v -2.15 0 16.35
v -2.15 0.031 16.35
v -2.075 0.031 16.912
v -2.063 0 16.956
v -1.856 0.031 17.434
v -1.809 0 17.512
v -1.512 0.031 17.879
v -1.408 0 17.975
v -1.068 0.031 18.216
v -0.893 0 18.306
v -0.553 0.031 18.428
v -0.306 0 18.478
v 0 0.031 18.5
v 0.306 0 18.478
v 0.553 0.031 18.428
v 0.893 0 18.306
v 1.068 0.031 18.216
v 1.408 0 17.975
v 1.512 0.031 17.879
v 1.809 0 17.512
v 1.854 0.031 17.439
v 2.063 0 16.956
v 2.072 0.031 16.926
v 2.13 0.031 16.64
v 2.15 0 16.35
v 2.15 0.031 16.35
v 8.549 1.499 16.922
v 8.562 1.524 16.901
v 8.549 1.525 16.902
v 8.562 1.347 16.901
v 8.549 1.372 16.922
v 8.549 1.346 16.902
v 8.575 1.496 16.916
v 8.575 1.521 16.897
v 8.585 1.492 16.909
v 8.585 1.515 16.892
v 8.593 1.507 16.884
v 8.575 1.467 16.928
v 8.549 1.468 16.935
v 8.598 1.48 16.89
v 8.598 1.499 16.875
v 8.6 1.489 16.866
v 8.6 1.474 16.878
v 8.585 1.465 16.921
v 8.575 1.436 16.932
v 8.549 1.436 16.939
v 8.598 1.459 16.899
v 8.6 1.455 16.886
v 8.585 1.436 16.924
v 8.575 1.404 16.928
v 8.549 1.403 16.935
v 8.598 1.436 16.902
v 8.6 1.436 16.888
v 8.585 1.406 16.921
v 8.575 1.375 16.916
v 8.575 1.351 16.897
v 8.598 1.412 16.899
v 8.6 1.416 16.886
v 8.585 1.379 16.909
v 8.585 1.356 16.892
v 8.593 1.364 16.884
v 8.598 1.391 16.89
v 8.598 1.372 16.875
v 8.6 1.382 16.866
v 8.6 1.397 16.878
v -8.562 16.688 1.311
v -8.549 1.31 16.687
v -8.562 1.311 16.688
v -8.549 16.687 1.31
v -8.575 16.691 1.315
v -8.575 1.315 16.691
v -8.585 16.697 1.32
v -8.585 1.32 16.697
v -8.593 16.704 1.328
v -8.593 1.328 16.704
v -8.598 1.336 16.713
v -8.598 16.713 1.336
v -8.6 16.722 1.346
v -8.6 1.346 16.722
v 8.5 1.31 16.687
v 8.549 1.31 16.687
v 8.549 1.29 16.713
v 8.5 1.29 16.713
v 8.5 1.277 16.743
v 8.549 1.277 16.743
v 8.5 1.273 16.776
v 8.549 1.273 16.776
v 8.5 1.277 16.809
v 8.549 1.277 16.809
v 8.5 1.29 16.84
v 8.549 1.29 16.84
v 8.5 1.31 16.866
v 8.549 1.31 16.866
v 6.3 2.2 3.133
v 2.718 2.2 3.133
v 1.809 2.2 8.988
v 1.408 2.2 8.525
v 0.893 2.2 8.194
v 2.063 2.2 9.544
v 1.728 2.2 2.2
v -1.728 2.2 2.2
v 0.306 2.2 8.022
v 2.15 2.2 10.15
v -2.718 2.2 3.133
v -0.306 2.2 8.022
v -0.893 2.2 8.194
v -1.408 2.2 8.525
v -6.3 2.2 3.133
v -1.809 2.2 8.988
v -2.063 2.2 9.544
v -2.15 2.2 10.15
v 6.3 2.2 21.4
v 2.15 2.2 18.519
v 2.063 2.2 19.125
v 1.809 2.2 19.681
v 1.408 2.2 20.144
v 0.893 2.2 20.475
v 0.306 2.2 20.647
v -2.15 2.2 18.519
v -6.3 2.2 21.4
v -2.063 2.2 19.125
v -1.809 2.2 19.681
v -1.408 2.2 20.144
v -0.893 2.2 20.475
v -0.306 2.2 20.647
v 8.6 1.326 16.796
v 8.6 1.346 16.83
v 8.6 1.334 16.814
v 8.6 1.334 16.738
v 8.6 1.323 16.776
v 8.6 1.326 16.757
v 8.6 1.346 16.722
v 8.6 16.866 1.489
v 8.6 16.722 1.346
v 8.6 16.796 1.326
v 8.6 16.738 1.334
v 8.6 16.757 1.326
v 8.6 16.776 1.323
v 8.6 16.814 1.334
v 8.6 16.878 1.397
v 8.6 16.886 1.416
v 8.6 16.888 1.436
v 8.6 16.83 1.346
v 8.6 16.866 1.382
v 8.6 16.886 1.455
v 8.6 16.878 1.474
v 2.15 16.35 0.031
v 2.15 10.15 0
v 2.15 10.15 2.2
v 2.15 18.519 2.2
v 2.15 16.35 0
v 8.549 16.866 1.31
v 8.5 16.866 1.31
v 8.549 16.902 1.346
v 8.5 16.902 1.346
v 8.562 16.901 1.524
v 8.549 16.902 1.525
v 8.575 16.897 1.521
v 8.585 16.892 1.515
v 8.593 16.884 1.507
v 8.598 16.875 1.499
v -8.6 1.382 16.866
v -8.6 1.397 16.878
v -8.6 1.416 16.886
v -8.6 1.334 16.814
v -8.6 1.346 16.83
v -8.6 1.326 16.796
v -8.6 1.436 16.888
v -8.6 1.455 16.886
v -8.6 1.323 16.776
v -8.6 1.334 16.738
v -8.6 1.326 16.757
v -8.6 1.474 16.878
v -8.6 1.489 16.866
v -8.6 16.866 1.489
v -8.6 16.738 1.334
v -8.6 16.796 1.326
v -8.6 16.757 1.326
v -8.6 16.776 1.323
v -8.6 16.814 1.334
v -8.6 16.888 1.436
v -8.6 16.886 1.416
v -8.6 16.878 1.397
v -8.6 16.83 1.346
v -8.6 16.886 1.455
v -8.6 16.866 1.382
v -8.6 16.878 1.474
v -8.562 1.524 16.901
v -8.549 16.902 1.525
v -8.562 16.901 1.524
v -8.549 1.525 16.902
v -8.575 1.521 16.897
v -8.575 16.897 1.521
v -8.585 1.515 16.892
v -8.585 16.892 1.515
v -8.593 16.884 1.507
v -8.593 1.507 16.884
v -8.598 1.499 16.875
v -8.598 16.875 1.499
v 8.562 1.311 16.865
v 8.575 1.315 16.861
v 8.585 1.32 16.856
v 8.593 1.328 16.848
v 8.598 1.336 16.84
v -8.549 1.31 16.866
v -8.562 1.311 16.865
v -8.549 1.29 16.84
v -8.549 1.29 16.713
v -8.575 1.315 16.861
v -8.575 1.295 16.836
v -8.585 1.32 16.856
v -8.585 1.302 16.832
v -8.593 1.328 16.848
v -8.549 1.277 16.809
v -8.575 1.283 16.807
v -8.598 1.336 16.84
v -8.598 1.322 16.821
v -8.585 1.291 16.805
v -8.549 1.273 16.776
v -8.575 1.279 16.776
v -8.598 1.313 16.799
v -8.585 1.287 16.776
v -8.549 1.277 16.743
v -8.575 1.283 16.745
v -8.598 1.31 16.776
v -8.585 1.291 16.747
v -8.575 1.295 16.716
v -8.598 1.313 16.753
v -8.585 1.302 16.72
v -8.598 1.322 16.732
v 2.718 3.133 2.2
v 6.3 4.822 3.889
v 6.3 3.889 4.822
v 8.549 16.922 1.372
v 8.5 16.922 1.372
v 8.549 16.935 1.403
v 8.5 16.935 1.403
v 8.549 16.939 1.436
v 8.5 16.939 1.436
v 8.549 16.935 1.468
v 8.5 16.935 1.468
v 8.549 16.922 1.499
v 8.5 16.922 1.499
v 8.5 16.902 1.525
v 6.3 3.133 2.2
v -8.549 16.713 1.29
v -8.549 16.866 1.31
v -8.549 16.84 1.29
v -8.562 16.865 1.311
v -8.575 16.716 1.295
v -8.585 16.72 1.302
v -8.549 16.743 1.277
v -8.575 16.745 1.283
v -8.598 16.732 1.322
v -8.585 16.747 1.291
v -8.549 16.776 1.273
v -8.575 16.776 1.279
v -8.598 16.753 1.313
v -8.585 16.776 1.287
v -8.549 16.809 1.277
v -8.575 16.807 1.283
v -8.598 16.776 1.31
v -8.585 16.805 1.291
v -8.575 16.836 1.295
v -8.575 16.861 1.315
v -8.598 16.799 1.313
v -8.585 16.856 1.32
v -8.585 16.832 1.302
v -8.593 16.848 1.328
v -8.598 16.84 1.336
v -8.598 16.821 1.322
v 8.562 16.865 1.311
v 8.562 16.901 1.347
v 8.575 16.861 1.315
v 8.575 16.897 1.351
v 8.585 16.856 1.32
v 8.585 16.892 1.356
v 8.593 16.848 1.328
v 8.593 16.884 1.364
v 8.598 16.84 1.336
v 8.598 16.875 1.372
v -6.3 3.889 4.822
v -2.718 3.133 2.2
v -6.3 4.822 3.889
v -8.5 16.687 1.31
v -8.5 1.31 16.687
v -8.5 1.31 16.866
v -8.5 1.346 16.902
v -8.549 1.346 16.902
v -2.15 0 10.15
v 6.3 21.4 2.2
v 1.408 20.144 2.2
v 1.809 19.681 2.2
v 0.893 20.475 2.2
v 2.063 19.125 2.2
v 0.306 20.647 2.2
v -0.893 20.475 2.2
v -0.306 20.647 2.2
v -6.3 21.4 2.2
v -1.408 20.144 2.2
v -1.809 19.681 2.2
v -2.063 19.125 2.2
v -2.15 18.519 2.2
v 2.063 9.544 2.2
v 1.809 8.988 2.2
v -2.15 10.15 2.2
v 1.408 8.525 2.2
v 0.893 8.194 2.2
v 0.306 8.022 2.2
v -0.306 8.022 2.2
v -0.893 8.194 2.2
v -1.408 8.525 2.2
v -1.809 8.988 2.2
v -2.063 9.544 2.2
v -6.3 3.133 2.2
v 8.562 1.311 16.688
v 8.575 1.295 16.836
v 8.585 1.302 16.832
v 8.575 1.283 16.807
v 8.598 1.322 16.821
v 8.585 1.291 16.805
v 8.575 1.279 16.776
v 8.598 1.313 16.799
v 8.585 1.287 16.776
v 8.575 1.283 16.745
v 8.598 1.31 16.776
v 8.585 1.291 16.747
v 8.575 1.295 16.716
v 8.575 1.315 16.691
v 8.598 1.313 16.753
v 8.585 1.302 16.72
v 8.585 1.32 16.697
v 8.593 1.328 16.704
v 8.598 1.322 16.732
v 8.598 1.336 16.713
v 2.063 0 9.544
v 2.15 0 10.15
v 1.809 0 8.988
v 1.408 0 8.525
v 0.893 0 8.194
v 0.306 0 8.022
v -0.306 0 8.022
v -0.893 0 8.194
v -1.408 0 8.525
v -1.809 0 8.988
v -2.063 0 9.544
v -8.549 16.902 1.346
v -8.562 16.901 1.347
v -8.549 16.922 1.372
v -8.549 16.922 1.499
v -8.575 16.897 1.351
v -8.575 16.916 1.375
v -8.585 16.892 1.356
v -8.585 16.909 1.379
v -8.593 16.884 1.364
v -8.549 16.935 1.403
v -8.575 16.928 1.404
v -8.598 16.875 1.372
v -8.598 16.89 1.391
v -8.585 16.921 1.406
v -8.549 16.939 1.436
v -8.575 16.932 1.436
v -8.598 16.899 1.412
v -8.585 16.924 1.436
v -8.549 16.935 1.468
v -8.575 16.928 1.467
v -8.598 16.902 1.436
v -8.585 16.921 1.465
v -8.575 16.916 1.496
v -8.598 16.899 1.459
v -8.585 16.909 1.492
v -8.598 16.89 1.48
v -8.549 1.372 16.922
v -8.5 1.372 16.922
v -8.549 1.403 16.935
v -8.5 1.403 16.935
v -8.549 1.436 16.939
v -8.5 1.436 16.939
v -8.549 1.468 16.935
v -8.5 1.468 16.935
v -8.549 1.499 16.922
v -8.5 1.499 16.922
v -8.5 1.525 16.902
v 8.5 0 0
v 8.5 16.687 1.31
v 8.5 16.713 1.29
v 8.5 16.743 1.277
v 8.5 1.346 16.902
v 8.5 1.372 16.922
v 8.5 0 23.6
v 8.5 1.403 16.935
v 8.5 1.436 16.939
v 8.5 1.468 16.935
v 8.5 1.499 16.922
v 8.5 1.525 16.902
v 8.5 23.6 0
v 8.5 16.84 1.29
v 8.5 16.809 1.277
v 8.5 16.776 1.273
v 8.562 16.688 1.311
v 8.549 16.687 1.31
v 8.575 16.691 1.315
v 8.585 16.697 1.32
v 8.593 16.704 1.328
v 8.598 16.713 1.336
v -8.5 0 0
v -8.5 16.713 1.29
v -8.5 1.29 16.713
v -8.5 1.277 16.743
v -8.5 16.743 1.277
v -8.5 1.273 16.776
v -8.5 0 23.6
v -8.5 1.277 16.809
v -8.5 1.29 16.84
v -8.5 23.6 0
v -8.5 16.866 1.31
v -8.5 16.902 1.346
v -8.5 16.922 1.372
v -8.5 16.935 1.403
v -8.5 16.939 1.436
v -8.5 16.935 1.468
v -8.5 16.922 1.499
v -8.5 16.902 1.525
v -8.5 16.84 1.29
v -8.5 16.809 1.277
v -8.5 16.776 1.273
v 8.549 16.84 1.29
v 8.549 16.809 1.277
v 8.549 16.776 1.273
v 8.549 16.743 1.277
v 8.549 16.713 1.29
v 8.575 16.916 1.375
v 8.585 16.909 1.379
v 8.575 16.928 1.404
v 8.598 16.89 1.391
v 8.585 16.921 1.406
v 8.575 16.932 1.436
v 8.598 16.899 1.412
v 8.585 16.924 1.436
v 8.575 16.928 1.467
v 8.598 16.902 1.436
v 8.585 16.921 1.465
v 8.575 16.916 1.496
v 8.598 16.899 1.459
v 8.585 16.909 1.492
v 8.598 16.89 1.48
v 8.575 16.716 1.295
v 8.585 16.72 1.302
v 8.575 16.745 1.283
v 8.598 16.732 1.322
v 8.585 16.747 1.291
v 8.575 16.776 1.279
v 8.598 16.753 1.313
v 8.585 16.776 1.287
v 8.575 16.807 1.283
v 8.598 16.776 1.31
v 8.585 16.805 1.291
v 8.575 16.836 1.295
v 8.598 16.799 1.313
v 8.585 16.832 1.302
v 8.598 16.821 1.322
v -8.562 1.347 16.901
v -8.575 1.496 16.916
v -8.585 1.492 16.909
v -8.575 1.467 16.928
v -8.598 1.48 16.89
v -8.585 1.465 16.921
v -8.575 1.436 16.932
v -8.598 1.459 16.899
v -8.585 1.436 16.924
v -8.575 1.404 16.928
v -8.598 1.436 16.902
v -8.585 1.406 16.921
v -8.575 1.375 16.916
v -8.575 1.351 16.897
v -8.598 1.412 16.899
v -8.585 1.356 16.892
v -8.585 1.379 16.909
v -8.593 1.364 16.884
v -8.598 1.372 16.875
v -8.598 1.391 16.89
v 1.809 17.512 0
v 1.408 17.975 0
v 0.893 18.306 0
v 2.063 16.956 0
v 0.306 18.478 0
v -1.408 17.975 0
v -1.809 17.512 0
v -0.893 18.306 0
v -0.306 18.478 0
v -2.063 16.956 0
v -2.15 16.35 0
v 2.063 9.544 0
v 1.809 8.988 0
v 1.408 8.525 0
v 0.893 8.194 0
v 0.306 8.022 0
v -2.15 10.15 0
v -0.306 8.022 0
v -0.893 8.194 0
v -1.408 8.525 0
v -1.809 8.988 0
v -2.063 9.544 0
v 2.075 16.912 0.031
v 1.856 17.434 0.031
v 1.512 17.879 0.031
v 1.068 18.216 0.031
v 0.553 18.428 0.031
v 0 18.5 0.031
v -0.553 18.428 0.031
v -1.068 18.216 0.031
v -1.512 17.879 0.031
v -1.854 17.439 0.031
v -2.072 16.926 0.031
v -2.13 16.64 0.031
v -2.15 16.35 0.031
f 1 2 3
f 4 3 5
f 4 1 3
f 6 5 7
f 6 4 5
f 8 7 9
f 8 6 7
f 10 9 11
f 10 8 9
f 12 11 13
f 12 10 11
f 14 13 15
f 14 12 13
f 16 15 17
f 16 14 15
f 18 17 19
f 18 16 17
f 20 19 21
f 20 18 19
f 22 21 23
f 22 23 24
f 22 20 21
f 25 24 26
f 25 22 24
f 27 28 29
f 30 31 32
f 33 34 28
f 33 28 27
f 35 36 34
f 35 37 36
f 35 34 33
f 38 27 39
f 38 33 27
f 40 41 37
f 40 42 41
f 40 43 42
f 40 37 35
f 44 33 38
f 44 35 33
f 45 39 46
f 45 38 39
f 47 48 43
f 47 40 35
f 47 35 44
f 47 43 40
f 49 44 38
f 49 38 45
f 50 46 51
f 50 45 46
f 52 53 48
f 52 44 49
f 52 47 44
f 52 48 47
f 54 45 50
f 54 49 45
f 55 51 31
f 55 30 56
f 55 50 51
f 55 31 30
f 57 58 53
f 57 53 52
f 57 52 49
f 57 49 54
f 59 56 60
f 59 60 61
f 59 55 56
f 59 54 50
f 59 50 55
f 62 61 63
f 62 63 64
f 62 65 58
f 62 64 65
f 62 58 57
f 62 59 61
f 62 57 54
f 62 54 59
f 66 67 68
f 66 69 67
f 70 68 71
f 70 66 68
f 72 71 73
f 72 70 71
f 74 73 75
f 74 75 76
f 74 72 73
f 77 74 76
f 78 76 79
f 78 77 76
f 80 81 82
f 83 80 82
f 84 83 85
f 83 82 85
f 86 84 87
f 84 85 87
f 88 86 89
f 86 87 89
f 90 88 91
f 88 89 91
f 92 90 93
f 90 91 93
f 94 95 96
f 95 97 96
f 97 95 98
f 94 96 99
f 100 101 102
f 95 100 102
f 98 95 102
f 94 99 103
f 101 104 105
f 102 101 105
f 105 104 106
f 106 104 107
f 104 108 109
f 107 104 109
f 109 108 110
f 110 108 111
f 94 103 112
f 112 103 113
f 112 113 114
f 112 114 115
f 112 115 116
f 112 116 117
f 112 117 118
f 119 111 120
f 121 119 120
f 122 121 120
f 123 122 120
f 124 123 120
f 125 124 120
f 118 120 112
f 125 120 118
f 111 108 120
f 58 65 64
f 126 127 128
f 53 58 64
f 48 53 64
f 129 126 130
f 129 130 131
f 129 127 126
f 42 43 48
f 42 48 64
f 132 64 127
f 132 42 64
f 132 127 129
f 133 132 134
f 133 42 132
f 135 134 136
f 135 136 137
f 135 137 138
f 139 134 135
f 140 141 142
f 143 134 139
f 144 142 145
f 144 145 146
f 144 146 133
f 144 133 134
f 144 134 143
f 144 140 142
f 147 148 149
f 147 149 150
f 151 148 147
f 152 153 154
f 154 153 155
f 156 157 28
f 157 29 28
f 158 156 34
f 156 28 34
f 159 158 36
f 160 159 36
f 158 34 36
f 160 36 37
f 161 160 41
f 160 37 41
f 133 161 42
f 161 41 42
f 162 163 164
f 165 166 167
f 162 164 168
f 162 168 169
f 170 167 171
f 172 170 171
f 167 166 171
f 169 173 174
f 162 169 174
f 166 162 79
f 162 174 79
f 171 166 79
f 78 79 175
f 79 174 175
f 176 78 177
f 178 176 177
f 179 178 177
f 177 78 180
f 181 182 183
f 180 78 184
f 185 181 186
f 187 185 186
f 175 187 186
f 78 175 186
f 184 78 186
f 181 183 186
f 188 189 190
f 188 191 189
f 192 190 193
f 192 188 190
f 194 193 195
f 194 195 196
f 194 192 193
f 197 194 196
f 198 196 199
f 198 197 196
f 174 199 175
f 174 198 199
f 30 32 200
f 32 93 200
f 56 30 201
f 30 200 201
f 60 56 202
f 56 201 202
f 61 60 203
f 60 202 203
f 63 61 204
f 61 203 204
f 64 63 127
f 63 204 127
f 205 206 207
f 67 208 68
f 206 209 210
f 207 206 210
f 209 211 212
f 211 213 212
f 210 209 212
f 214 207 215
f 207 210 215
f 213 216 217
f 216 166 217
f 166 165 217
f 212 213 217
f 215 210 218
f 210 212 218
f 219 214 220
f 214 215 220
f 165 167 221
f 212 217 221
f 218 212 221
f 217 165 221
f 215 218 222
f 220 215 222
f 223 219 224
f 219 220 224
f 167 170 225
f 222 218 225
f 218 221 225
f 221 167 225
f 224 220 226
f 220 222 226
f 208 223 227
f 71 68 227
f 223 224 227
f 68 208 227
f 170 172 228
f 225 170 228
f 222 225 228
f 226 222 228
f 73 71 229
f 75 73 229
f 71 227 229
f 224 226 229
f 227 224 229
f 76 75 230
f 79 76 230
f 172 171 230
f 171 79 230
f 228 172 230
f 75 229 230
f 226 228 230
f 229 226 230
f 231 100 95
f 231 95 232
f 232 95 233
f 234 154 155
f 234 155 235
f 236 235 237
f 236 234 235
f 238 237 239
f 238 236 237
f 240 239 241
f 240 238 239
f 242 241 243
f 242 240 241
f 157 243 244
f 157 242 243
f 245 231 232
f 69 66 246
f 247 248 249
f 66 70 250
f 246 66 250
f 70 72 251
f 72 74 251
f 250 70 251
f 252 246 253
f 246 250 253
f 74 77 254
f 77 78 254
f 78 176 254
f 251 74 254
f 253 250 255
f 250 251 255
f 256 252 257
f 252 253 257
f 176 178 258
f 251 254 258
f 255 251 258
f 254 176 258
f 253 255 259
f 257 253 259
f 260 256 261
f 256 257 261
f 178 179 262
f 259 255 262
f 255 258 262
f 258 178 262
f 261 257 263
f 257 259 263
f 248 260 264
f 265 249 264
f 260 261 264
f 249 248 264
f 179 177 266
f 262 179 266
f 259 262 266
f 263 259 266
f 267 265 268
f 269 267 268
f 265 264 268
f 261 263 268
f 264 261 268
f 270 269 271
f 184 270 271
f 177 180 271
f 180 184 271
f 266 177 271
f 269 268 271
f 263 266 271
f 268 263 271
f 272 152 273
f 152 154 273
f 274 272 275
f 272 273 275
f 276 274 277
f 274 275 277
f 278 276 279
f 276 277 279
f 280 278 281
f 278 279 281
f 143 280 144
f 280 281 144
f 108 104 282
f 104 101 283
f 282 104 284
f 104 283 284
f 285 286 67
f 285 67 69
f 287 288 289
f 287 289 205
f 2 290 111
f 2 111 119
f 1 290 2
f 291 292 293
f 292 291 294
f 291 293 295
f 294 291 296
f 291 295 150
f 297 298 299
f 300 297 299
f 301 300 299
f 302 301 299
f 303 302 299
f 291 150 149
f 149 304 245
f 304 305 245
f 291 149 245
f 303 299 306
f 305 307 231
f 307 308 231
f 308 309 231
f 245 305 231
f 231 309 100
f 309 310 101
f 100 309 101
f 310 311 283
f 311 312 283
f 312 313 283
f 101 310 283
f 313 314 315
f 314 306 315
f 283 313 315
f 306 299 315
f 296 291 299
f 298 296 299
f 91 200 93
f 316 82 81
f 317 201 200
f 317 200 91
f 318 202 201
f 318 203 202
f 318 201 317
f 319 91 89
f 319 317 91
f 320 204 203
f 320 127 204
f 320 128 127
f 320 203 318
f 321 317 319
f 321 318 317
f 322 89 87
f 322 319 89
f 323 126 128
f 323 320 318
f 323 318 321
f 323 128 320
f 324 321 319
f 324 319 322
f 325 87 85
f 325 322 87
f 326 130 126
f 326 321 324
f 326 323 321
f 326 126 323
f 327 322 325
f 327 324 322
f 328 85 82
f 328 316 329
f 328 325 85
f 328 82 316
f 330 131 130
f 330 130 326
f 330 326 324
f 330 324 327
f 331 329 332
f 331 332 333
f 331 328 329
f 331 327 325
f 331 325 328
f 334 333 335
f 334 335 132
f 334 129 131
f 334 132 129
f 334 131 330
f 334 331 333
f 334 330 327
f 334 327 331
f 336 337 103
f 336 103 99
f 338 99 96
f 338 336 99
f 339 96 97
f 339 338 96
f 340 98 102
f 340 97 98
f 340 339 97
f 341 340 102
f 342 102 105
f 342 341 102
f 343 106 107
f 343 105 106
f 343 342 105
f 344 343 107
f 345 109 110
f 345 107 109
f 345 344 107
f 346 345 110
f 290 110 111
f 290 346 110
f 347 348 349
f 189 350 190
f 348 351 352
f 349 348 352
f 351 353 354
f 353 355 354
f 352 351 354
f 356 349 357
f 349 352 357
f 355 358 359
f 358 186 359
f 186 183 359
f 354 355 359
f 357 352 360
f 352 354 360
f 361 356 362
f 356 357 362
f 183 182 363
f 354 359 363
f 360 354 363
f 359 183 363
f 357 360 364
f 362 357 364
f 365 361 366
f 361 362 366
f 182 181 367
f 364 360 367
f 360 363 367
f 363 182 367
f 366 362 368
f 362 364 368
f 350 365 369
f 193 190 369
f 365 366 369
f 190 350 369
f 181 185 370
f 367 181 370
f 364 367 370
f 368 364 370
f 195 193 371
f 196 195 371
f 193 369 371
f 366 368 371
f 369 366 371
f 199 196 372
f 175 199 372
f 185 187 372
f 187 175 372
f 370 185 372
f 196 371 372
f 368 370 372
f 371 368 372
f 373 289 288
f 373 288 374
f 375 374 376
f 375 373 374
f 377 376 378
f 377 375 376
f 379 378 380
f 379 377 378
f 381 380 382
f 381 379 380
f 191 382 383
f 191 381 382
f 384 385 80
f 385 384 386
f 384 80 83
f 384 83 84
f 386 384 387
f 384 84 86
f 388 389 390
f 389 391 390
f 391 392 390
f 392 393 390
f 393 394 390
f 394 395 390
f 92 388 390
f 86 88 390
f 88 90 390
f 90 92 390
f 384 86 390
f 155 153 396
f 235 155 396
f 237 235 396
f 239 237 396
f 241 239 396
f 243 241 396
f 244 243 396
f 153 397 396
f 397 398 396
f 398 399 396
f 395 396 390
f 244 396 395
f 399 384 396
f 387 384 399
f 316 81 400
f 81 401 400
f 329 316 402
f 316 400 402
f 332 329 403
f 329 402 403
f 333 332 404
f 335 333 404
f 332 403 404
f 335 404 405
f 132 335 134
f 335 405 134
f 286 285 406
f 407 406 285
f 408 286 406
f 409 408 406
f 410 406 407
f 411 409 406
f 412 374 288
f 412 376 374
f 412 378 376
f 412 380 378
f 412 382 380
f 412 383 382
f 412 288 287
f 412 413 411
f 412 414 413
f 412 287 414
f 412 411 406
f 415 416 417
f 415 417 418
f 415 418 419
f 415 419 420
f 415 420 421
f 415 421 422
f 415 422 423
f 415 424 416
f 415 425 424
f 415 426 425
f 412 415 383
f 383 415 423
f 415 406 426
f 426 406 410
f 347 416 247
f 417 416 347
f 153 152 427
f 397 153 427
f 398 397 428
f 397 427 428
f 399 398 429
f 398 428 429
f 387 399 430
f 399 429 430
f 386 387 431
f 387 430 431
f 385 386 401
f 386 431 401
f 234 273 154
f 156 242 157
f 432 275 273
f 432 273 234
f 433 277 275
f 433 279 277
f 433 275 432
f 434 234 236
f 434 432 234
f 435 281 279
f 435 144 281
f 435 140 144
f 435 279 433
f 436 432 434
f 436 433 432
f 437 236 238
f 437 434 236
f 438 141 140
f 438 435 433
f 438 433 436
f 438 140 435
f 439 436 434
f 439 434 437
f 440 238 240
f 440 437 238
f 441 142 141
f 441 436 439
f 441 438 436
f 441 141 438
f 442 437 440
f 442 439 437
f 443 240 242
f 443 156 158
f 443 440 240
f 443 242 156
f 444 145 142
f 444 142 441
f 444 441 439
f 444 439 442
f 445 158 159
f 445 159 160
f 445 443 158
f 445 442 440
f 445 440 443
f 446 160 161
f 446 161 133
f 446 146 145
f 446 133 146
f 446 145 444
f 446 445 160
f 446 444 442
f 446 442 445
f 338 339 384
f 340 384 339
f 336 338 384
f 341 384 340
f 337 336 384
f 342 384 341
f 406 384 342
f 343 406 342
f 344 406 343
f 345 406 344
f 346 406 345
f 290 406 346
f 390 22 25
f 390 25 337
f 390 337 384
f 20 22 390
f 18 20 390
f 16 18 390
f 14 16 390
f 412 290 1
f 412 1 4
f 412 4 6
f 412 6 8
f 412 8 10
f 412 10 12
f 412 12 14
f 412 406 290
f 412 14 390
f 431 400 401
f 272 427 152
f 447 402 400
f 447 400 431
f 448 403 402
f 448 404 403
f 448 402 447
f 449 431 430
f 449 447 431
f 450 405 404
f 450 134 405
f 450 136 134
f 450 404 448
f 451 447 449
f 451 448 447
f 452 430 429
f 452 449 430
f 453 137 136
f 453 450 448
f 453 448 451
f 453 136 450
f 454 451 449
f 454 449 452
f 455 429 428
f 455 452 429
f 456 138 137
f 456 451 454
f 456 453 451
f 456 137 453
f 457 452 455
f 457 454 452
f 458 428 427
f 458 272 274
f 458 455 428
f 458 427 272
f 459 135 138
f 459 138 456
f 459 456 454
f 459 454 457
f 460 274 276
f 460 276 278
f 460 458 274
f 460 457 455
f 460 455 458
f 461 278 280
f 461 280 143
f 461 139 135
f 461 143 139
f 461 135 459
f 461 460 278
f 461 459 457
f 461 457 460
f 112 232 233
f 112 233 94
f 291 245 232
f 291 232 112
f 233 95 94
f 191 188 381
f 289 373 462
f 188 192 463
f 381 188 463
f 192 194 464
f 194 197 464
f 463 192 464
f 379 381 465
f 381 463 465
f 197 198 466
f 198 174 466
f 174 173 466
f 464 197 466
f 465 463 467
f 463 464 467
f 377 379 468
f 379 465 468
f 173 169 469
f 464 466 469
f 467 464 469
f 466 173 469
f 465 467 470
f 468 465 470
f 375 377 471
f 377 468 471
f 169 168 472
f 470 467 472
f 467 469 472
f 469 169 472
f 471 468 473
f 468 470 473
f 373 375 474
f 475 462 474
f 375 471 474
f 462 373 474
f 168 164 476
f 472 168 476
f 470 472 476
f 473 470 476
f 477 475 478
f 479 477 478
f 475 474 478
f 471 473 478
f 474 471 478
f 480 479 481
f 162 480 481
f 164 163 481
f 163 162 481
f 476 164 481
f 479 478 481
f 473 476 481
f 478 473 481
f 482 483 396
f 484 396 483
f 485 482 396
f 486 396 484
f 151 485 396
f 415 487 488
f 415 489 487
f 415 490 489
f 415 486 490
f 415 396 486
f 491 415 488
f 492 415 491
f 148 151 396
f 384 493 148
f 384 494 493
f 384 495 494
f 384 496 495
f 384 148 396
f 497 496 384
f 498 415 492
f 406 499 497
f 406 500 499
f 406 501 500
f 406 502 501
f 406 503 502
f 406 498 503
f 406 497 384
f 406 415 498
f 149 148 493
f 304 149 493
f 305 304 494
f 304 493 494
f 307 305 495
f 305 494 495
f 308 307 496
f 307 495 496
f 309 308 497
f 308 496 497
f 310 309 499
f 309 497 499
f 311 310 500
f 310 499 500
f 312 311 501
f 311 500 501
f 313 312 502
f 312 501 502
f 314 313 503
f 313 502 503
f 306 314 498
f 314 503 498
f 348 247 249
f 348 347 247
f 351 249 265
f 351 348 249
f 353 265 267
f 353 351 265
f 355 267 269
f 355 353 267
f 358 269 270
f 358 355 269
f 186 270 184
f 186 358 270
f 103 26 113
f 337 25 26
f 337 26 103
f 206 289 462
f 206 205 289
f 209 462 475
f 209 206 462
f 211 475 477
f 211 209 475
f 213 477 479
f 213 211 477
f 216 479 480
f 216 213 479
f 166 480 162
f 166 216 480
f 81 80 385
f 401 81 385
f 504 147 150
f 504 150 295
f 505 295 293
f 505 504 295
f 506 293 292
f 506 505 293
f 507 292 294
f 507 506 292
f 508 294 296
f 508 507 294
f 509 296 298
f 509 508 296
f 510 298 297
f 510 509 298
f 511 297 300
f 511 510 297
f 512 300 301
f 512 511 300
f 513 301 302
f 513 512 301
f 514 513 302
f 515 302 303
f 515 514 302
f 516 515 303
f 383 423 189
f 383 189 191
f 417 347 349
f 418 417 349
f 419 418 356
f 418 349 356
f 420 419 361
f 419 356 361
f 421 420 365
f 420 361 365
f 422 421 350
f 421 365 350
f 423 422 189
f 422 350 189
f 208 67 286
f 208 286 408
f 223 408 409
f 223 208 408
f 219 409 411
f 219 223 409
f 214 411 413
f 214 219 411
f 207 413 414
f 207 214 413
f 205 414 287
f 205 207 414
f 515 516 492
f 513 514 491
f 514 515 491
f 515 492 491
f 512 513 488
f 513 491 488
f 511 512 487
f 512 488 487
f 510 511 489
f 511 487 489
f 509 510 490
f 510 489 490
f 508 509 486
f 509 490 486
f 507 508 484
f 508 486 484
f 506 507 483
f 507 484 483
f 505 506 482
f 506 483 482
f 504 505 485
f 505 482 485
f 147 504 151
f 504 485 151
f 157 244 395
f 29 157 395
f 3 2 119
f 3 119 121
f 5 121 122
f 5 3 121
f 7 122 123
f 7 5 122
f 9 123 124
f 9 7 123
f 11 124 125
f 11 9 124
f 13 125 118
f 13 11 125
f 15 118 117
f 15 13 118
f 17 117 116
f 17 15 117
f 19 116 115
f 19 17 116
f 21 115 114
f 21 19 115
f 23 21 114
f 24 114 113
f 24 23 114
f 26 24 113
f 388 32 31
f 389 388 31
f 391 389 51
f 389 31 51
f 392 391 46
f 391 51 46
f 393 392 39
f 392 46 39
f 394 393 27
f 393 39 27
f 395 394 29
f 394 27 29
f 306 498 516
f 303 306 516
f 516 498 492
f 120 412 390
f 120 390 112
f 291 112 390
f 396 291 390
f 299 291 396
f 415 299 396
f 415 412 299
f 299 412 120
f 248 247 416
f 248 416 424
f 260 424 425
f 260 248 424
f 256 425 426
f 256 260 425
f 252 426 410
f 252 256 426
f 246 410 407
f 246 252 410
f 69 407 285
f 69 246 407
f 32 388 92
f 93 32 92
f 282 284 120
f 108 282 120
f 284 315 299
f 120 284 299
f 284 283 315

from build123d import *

# Parameters (mm, degrees)
BOSS_EXTRUDE1_DEPTH      = 8.5
BOSS_EXTRUDE1_DEPTH_BACK = 8.5
SHELL1_T                 = -2.2
BOSS_EXTRUDE2_DEPTH      = 0.66
CUT_EXTRUDE1_REACH       = 36.441
CUT_EXTRUDE2_REACH       = 36.441
EXTRUDE_THIN1_DEPTH      = 0.1
FILLET1_R                = 0.127
FILLET2_R                = 0.0508
FILLET1_OF_MIRROR1_R     = 0.127
FILLET2_OF_MIRROR1_R     = 0.0508


with BuildPart() as part:
    # Sketch4 → Boss-Extrude1 (new, two sides: drawn at the far end of the back side and taken through both)
    with BuildSketch(Plane(origin=(0, 0, 0), x_dir=(0, 0, -1), z_dir=(1, 0, 0)).offset(-BOSS_EXTRUDE1_DEPTH_BACK)):
        Polygon((0, 0), (-23.6, 0), (0, 23.6), align=None)
    extrude(amount=BOSS_EXTRUDE1_DEPTH + BOSS_EXTRUDE1_DEPTH_BACK)

    # Shell1
    shell1_openings = [part.faces().sort_by_distance(p)[0] for p in [
        (0, 11.8, 11.8),
    ]]
    offset(amount=SHELL1_T, openings=shell1_openings, kind=Kind.INTERSECTION)

    # Sketch5 → Boss-Extrude2 (add, symmetric)
    with BuildSketch(Plane(origin=(0, 0, 0), x_dir=(1, 0, 0), z_dir=(0, 0.7071067811865477, -0.7071067811865474))):
        Polygon((6.3, -3.111269837), (1.728, -3.111269837), (6.3, -6.159269837), align=None)
        Polygon((-1.728, -3.111269837), (-6.3, -6.159269837), (-6.3, -3.111269837), align=None)
    extrude(amount=BOSS_EXTRUDE2_DEPTH, both=True)

    # Sketch9 → Cut-Extrude1 (cut, up to next)
    with BuildSketch(Plane.XZ, mode=Mode.PRIVATE) as cut_extrude1_sk1:
        with BuildLine():
            Line((-2.15, 10.15), (-2.15, 16.35))
            ThreePointArc((-2.15, 16.35), (0, 18.5), (2.15, 16.35))
            Line((2.15, 16.35), (2.15, 10.15))
            ThreePointArc((2.15, 10.15), (0, 8), (-2.15, 10.15))
        make_face()
    cut_extrude1_tool1 = extrude(cut_extrude1_sk1.sketch, amount=-CUT_EXTRUDE1_REACH, mode=Mode.PRIVATE) & part.part
    add(cut_extrude1_tool1.solids().sort_by_distance((0, 0, 13.25))[0], mode=Mode.SUBTRACT)

    # Cut-Sweep2: sweep along a path in Sketch8
    with BuildLine(Plane(origin=(0, 0, 0), x_dir=(0, 0, -1), z_dir=(1, 0, 0))) as cut_sweep2_path:
        Line((-20.7, 2.2), (-18.5, 0))
    # Sketch10 → Cut-Sweep2 (sweep, cut)
    with BuildSketch(Plane(origin=(0, 2.2, 0), x_dir=(1, 0, 0), z_dir=(0, 1, 0))):
        with BuildLine():
            Line((-2.15, -18.519), (-2.15, -16.35))
            Line((-2.15, -16.35), (2.15, -16.35))
            Line((2.15, -16.35), (2.15, -18.519))
            ThreePointArc((2.15, -18.519), (0, -20.669), (-2.15, -18.519))
        make_face()
    sweep(path=cut_sweep2_path.line, mode=Mode.SUBTRACT)

    # Sketch11 → Cut-Extrude2 (cut, up to next)
    with BuildSketch(Plane(origin=(0, 0, 0), x_dir=(-1, 0, 0), z_dir=(0, 0, -1)), mode=Mode.PRIVATE) as cut_extrude2_sk1:
        with BuildLine():
            Line((-2.15, 16.35), (-2.15, 10.15))
            ThreePointArc((-2.15, 10.15), (0, 8), (2.15, 10.15))
            Line((2.15, 10.15), (2.15, 16.35))
            ThreePointArc((2.15, 16.35), (0, 18.5), (-2.15, 16.35))
        make_face()
    cut_extrude2_tool1 = extrude(cut_extrude2_sk1.sketch, amount=-CUT_EXTRUDE2_REACH, mode=Mode.PRIVATE) & part.part
    add(cut_extrude2_tool1.solids().sort_by_distance((0, 13.25, 0))[0], mode=Mode.SUBTRACT)

    # Cut-Sweep3: sweep along a path in Sketch13
    with BuildLine(Plane(origin=(0, 0, 0), x_dir=(0, 0, -1), z_dir=(1, 0, 0))) as cut_sweep3_path:
        Line((-2.2, 20.7), (0, 18.5))
    # Sketch12 → Cut-Sweep3 (sweep, cut)
    with BuildSketch(Plane.XY.offset(2.2)):
        with BuildLine():
            Line((-2.15, 18.519), (-2.15, 16.35))
            Line((-2.15, 16.35), (2.15, 16.35))
            Line((2.15, 16.35), (2.15, 18.519))
            ThreePointArc((2.15, 18.519), (0, 20.669), (-2.15, 18.519))
        make_face()
    sweep(path=cut_sweep3_path.line, mode=Mode.SUBTRACT)

    # Sketch14 → Extrude-Thin1 (add)
    with BuildSketch(Plane(origin=(8.5, 0, 0), x_dir=(0, 0, -1), z_dir=(1, 0, 0))):
        Polygon((-1.435511644, 16.99186083), (-16.99186083, 1.435511644), (-16.776334683, 1.219985497), (-1.219985497, 16.776334683), align=None)
    extrude_thin1 = extrude(amount=EXTRUDE_THIN1_DEPTH)

    # Fillet1
    fillet1_edges = [part.edges().sort_by_distance(p)[0] for p in [
        (8.55, 16.99186083, 1.435511644),
        (8.55, 1.435511644, 16.99186083),
        (8.55, 1.219985497, 16.776334683),
        (8.55, 16.776334683, 1.219985497),
    ]]
    fillet(fillet1_edges, radius=FILLET1_R)

    # Fillet2
    fillet2_edges = [part.edges().sort_by_distance(p)[0] for p in [
        (8.6, 9.213686237, 9.213686237),
        (8.6, 16.884097757, 1.327748571),
        (8.6, 1.327748571, 16.884097757),
        (8.6, 8.99816009, 8.99816009),
        (8.6, 1.435511644, 16.939255708),
        (8.6, 1.27259062, 16.776334683),
        (8.6, 16.776334683, 1.27259062),
        (8.6, 16.939255708, 1.435511644),
    ]]
    fillet(fillet2_edges, radius=FILLET2_R)

    # Mirror1: Extrude-Thin1 across plane
    add(extrude_thin1.mirror(Plane(origin=(0, 0, 0), x_dir=(0, 0, 1), z_dir=(1, 0, 0))))

    # Fillet1 of Mirror1
    fillet1_of_mirror1_edges = [part.edges().sort_by_distance(p)[0] for p in [
        (-8.55, 16.99186083, 1.435511644),
        (-8.55, 1.435511644, 16.99186083),
        (-8.55, 1.219985497, 16.776334683),
        (-8.55, 16.776334683, 1.219985497),
    ]]
    fillet(fillet1_of_mirror1_edges, radius=FILLET1_OF_MIRROR1_R)

    # Fillet2 of Mirror1
    fillet2_of_mirror1_edges = [part.edges().sort_by_distance(p)[0] for p in [
        (-8.6, 9.213686237, 9.213686237),
        (-8.6, 16.884097757, 1.327748571),
        (-8.6, 1.327748571, 16.884097757),
        (-8.6, 8.99816009, 8.99816009),
        (-8.6, 1.435511644, 16.939255708),
        (-8.6, 1.27259062, 16.776334683),
        (-8.6, 16.776334683, 1.27259062),
        (-8.6, 16.939255708, 1.435511644),
    ]]
    fillet(fillet2_of_mirror1_edges, radius=FILLET2_OF_MIRROR1_R)


solid = part.part
